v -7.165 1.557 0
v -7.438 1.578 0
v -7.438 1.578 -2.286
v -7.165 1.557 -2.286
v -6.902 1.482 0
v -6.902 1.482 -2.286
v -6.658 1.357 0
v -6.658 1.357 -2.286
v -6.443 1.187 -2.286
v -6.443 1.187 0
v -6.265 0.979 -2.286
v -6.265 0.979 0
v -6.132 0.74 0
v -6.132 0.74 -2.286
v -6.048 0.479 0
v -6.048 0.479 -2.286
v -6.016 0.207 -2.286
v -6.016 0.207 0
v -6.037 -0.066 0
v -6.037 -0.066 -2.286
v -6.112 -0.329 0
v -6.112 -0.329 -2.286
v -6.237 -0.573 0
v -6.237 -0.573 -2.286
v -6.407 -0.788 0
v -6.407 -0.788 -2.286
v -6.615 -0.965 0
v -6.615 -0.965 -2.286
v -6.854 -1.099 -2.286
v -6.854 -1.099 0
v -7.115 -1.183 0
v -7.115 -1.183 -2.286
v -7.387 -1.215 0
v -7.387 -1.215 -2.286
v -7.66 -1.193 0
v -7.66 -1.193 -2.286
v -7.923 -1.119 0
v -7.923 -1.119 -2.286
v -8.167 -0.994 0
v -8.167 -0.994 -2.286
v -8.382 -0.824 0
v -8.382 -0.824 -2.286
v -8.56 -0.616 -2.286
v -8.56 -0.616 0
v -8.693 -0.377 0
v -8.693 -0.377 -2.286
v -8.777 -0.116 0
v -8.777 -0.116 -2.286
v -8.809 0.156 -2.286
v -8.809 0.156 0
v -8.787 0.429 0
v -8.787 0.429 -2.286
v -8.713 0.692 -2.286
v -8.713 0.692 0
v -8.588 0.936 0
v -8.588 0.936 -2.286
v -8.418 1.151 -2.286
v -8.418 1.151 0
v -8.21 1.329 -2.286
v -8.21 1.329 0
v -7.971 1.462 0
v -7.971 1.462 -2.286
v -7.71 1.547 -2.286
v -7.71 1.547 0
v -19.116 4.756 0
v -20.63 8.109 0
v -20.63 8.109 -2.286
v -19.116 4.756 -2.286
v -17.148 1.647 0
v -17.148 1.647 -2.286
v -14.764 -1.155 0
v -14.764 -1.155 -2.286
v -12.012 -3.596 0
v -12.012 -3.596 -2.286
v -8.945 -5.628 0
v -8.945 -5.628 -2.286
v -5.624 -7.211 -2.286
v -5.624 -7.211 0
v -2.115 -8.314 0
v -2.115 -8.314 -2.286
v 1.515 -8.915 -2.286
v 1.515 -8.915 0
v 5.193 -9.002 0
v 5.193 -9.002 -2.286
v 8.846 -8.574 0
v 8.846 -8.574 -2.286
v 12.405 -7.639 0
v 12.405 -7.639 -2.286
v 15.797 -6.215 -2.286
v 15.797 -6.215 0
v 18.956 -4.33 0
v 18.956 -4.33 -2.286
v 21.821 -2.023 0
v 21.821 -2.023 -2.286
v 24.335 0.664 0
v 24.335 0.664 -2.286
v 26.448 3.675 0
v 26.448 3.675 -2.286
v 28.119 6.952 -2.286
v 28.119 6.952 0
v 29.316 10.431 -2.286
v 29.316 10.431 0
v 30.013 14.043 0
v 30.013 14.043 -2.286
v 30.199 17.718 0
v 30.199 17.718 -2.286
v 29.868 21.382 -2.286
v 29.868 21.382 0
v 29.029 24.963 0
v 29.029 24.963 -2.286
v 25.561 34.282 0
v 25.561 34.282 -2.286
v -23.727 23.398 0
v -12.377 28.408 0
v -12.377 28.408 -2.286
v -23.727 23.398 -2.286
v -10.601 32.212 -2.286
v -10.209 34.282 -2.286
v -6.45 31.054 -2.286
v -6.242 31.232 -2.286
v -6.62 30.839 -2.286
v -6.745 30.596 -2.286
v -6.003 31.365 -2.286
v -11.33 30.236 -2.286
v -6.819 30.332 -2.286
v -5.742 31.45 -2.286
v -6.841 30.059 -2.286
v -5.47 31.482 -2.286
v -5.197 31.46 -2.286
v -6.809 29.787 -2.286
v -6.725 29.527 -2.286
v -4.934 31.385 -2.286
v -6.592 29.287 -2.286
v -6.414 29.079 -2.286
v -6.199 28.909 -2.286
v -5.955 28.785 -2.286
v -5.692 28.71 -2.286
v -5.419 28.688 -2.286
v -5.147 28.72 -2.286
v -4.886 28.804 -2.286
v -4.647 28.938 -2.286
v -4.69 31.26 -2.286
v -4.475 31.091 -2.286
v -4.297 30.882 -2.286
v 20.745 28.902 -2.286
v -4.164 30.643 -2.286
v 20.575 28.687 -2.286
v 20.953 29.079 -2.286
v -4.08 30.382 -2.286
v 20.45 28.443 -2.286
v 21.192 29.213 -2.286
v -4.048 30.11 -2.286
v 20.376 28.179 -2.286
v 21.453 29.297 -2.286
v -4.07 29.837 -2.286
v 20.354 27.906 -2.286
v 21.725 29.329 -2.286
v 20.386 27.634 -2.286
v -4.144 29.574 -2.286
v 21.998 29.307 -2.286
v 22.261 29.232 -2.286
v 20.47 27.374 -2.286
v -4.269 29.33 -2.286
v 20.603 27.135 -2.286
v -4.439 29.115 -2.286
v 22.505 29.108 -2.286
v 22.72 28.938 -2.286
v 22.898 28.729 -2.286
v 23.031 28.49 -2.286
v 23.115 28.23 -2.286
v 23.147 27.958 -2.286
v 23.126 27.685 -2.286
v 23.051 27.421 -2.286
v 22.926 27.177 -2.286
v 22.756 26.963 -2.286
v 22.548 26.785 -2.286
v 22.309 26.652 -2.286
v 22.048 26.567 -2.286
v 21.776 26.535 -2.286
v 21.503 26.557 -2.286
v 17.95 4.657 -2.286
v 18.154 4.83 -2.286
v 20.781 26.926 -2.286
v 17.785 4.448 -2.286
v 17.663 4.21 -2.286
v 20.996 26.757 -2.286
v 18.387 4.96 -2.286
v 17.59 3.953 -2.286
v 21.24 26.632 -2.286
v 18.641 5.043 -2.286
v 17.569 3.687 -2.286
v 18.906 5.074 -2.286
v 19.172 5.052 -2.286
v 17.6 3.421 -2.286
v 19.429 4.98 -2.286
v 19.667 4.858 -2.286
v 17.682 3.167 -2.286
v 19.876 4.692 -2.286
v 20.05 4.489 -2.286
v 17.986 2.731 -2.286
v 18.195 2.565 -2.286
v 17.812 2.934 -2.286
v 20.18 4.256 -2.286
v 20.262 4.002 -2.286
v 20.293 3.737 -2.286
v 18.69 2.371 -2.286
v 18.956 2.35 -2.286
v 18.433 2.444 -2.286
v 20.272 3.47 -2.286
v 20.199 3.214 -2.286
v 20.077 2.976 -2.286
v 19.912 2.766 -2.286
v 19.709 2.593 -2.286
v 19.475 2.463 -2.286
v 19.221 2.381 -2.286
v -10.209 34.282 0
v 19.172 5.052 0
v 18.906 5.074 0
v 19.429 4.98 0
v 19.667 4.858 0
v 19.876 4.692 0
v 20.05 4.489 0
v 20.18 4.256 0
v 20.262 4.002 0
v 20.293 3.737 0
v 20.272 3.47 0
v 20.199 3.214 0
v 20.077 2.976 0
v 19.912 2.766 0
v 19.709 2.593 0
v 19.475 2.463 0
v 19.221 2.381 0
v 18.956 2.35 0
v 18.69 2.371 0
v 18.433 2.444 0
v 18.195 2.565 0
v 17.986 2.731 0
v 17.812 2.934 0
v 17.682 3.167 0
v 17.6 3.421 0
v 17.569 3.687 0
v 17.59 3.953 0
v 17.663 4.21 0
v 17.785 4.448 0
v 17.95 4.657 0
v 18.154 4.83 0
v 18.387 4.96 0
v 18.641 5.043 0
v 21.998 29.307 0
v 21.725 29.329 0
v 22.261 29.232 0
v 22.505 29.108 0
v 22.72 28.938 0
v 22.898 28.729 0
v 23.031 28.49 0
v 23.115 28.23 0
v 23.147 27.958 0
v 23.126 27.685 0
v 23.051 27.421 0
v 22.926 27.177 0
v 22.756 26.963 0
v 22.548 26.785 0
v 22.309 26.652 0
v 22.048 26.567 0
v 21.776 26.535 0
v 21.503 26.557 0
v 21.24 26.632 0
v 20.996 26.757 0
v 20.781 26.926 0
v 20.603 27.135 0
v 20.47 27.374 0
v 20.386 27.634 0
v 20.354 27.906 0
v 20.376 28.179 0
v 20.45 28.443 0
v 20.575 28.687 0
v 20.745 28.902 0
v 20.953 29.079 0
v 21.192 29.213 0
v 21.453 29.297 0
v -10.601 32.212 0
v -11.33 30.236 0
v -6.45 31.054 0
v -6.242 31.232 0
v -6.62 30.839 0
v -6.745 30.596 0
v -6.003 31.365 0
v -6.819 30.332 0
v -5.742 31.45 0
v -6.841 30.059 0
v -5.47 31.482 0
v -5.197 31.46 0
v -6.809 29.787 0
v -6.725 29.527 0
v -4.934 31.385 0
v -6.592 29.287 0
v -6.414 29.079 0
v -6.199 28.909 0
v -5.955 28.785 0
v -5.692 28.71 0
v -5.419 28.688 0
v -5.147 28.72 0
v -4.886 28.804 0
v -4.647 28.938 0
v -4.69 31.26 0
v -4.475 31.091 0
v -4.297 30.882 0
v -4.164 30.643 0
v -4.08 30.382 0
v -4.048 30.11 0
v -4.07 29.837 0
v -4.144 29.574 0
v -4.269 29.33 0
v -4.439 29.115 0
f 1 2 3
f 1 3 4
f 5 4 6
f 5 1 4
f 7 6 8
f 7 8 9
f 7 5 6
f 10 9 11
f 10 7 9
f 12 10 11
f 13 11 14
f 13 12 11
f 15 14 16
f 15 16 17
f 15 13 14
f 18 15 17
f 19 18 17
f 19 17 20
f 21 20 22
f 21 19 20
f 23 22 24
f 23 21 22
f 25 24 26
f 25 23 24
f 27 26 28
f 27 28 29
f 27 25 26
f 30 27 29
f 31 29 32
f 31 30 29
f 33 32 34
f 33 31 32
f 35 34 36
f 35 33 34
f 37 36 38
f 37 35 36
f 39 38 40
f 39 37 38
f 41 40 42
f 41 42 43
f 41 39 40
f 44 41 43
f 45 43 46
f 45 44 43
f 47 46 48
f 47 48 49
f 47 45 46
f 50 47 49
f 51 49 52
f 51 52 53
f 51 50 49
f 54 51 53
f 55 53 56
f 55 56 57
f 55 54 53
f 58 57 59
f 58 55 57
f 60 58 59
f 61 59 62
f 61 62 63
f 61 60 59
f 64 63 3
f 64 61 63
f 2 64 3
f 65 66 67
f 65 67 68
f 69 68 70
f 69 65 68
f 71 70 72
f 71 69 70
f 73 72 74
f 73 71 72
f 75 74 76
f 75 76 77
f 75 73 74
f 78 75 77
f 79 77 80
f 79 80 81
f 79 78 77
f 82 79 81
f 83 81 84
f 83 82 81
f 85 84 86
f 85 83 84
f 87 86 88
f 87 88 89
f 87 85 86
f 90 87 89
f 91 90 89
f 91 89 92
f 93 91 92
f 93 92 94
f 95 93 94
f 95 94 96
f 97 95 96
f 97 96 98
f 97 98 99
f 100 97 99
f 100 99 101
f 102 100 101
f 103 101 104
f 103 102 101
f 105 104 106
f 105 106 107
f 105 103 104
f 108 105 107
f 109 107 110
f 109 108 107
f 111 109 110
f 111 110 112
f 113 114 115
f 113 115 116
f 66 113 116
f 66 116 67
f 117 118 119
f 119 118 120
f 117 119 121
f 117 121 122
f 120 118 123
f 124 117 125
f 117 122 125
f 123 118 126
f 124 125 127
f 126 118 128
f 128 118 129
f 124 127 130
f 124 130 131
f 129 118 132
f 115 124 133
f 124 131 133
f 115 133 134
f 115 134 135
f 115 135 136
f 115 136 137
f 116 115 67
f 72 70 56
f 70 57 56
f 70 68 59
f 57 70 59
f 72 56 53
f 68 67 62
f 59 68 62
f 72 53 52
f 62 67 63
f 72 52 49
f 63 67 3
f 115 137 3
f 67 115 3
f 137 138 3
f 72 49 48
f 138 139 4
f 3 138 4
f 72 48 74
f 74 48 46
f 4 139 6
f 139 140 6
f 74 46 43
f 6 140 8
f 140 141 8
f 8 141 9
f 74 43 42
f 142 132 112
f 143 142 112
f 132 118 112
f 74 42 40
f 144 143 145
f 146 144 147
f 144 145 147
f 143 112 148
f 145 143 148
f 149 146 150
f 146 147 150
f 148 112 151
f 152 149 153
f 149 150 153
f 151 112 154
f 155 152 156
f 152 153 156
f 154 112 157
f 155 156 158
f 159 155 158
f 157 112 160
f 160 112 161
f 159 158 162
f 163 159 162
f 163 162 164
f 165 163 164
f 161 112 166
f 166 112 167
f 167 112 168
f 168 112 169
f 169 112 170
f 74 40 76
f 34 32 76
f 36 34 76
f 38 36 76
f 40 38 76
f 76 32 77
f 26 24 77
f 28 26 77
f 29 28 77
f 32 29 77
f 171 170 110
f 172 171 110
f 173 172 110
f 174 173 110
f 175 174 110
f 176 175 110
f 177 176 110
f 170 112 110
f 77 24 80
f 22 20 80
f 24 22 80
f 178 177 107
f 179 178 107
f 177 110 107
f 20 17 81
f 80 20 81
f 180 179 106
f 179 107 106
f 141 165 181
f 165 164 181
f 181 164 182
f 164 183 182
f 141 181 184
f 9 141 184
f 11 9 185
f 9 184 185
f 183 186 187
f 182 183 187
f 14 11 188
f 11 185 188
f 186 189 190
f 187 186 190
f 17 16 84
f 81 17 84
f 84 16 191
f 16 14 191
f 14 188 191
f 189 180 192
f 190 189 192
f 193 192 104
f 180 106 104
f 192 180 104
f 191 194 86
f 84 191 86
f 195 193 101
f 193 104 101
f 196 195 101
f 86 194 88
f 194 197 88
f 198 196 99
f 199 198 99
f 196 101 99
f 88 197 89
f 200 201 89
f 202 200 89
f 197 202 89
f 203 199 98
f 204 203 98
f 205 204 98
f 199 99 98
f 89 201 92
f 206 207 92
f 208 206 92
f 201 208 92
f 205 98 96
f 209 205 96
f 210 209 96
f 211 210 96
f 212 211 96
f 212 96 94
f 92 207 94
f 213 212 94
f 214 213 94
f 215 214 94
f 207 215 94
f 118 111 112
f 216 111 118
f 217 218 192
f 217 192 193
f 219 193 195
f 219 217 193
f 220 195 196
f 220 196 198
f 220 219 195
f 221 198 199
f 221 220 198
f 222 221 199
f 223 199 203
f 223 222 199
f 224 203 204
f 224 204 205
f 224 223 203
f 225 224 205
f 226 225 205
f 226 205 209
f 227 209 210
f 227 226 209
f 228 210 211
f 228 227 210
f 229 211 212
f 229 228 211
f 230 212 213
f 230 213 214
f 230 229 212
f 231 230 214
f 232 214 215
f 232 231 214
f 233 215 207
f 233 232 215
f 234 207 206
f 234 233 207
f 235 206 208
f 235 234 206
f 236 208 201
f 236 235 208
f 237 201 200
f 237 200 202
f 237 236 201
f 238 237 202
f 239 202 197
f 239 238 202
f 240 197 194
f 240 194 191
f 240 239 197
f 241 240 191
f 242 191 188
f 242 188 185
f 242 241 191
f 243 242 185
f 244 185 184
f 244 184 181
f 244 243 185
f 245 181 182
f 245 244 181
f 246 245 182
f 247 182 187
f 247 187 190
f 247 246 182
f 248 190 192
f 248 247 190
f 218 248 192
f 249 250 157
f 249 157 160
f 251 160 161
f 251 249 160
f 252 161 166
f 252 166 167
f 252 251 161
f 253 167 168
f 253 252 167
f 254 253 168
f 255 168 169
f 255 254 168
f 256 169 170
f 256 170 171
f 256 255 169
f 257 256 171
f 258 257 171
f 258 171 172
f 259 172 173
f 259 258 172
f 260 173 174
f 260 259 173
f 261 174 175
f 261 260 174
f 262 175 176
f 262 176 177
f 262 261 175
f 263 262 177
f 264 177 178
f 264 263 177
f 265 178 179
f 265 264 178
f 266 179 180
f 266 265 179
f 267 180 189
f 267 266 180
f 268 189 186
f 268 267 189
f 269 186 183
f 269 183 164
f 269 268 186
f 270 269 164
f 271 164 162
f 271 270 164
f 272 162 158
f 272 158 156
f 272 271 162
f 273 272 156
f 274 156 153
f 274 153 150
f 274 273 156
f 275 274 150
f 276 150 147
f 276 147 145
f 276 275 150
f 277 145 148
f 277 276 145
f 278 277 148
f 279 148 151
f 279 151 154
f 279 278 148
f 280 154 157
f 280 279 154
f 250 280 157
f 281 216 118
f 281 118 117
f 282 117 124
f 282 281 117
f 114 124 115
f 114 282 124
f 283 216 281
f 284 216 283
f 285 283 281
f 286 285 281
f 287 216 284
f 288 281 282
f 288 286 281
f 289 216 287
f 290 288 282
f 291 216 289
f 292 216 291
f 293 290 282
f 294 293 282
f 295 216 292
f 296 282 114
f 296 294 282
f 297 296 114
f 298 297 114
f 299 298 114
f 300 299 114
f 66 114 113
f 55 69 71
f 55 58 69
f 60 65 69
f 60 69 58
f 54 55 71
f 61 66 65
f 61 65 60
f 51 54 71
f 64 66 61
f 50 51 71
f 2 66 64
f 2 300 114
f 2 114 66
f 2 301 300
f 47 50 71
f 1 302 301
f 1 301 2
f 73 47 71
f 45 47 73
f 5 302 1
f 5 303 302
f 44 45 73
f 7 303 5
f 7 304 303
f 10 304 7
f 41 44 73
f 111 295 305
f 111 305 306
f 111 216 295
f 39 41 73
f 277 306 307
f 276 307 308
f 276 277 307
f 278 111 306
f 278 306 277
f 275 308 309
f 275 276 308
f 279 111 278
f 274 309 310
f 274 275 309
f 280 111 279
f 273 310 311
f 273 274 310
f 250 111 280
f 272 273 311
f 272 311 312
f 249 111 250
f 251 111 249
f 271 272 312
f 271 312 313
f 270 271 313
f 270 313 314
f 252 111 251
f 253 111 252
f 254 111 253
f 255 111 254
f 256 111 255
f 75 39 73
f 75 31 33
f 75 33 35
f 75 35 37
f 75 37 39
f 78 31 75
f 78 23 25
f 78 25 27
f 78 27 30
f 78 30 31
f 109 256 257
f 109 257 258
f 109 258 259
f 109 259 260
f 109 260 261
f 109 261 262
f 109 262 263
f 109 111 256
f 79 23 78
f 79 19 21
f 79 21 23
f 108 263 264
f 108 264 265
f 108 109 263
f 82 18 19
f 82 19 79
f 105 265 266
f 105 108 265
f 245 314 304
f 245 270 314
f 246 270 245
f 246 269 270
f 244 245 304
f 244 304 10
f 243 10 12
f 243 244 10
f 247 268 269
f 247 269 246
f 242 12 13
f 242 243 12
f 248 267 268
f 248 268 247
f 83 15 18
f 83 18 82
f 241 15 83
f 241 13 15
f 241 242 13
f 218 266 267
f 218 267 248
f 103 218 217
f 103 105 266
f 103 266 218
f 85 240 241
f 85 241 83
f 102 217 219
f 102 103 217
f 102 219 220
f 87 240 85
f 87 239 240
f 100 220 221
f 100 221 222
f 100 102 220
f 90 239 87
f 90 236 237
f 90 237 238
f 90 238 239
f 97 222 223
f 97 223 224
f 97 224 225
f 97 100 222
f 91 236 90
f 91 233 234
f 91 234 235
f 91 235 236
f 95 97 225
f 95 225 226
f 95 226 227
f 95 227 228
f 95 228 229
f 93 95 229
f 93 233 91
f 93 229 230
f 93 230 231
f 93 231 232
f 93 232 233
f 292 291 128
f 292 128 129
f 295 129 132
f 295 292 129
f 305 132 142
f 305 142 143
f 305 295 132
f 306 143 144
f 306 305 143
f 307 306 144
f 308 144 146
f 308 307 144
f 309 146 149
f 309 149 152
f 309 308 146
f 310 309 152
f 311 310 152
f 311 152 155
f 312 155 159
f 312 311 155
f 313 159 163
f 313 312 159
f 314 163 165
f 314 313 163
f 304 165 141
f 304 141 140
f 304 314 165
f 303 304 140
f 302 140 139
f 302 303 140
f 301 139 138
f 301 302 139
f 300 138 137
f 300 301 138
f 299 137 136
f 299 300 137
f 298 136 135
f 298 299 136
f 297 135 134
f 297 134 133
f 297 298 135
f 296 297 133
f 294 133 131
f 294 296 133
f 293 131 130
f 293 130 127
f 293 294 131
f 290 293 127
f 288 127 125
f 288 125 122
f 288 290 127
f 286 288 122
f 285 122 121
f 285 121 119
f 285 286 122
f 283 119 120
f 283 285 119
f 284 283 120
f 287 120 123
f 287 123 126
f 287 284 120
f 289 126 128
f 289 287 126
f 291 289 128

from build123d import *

# Parameters (mm, degrees)
SKETCH5_R      = 1.397
SKETCH5_R_2    = 1.362219034
EXTRUDE1_DEPTH = 2.286


with BuildPart() as part:
    # Sketch5 → Extrude1 (new body)
    with BuildSketch(Plane(origin=(0, 0, 0), x_dir=(-0.018375543, 0.999831155, 0), z_dir=(0, 0, -1))):
        with BuildLine():
            Line((33.80665155, 26.18621859), (34.46394605, -9.577814671))
            ThreePointArc((34.46394605, -9.577814671), (31.404055355, -10.348947358), (28.630167887, -11.853315998))
            Line((28.630167887, -11.853315998), (23.830153765, -23.292701447))
            Line((23.830153765, -23.292701447), (8.486225874, -20.477486777))
            ThreePointArc((8.486225874, -20.477486777), (-7.865336256, 12.262044577), (24.425706506, 29.482353943))
            Line((24.425706506, 29.482353943), (33.80665155, 26.18621859))
        make_face()
        with Locations((27.527734531, 22.260177192)):
            Circle(SKETCH5_R, mode=Mode.SUBTRACT)
        with Locations((30.179746314, -4.890797216)):
            Circle(SKETCH5_R, mode=Mode.SUBTRACT)
        with Locations((3.363138785, 18.996048152)):
            Circle(SKETCH5_R_2, mode=Mode.SUBTRACT)
        with Locations((0.317842079, -7.407837933)):
            Circle(SKETCH5_R, mode=Mode.SUBTRACT)
    extrude(amount=EXTRUDE1_DEPTH)


solid = part.part
